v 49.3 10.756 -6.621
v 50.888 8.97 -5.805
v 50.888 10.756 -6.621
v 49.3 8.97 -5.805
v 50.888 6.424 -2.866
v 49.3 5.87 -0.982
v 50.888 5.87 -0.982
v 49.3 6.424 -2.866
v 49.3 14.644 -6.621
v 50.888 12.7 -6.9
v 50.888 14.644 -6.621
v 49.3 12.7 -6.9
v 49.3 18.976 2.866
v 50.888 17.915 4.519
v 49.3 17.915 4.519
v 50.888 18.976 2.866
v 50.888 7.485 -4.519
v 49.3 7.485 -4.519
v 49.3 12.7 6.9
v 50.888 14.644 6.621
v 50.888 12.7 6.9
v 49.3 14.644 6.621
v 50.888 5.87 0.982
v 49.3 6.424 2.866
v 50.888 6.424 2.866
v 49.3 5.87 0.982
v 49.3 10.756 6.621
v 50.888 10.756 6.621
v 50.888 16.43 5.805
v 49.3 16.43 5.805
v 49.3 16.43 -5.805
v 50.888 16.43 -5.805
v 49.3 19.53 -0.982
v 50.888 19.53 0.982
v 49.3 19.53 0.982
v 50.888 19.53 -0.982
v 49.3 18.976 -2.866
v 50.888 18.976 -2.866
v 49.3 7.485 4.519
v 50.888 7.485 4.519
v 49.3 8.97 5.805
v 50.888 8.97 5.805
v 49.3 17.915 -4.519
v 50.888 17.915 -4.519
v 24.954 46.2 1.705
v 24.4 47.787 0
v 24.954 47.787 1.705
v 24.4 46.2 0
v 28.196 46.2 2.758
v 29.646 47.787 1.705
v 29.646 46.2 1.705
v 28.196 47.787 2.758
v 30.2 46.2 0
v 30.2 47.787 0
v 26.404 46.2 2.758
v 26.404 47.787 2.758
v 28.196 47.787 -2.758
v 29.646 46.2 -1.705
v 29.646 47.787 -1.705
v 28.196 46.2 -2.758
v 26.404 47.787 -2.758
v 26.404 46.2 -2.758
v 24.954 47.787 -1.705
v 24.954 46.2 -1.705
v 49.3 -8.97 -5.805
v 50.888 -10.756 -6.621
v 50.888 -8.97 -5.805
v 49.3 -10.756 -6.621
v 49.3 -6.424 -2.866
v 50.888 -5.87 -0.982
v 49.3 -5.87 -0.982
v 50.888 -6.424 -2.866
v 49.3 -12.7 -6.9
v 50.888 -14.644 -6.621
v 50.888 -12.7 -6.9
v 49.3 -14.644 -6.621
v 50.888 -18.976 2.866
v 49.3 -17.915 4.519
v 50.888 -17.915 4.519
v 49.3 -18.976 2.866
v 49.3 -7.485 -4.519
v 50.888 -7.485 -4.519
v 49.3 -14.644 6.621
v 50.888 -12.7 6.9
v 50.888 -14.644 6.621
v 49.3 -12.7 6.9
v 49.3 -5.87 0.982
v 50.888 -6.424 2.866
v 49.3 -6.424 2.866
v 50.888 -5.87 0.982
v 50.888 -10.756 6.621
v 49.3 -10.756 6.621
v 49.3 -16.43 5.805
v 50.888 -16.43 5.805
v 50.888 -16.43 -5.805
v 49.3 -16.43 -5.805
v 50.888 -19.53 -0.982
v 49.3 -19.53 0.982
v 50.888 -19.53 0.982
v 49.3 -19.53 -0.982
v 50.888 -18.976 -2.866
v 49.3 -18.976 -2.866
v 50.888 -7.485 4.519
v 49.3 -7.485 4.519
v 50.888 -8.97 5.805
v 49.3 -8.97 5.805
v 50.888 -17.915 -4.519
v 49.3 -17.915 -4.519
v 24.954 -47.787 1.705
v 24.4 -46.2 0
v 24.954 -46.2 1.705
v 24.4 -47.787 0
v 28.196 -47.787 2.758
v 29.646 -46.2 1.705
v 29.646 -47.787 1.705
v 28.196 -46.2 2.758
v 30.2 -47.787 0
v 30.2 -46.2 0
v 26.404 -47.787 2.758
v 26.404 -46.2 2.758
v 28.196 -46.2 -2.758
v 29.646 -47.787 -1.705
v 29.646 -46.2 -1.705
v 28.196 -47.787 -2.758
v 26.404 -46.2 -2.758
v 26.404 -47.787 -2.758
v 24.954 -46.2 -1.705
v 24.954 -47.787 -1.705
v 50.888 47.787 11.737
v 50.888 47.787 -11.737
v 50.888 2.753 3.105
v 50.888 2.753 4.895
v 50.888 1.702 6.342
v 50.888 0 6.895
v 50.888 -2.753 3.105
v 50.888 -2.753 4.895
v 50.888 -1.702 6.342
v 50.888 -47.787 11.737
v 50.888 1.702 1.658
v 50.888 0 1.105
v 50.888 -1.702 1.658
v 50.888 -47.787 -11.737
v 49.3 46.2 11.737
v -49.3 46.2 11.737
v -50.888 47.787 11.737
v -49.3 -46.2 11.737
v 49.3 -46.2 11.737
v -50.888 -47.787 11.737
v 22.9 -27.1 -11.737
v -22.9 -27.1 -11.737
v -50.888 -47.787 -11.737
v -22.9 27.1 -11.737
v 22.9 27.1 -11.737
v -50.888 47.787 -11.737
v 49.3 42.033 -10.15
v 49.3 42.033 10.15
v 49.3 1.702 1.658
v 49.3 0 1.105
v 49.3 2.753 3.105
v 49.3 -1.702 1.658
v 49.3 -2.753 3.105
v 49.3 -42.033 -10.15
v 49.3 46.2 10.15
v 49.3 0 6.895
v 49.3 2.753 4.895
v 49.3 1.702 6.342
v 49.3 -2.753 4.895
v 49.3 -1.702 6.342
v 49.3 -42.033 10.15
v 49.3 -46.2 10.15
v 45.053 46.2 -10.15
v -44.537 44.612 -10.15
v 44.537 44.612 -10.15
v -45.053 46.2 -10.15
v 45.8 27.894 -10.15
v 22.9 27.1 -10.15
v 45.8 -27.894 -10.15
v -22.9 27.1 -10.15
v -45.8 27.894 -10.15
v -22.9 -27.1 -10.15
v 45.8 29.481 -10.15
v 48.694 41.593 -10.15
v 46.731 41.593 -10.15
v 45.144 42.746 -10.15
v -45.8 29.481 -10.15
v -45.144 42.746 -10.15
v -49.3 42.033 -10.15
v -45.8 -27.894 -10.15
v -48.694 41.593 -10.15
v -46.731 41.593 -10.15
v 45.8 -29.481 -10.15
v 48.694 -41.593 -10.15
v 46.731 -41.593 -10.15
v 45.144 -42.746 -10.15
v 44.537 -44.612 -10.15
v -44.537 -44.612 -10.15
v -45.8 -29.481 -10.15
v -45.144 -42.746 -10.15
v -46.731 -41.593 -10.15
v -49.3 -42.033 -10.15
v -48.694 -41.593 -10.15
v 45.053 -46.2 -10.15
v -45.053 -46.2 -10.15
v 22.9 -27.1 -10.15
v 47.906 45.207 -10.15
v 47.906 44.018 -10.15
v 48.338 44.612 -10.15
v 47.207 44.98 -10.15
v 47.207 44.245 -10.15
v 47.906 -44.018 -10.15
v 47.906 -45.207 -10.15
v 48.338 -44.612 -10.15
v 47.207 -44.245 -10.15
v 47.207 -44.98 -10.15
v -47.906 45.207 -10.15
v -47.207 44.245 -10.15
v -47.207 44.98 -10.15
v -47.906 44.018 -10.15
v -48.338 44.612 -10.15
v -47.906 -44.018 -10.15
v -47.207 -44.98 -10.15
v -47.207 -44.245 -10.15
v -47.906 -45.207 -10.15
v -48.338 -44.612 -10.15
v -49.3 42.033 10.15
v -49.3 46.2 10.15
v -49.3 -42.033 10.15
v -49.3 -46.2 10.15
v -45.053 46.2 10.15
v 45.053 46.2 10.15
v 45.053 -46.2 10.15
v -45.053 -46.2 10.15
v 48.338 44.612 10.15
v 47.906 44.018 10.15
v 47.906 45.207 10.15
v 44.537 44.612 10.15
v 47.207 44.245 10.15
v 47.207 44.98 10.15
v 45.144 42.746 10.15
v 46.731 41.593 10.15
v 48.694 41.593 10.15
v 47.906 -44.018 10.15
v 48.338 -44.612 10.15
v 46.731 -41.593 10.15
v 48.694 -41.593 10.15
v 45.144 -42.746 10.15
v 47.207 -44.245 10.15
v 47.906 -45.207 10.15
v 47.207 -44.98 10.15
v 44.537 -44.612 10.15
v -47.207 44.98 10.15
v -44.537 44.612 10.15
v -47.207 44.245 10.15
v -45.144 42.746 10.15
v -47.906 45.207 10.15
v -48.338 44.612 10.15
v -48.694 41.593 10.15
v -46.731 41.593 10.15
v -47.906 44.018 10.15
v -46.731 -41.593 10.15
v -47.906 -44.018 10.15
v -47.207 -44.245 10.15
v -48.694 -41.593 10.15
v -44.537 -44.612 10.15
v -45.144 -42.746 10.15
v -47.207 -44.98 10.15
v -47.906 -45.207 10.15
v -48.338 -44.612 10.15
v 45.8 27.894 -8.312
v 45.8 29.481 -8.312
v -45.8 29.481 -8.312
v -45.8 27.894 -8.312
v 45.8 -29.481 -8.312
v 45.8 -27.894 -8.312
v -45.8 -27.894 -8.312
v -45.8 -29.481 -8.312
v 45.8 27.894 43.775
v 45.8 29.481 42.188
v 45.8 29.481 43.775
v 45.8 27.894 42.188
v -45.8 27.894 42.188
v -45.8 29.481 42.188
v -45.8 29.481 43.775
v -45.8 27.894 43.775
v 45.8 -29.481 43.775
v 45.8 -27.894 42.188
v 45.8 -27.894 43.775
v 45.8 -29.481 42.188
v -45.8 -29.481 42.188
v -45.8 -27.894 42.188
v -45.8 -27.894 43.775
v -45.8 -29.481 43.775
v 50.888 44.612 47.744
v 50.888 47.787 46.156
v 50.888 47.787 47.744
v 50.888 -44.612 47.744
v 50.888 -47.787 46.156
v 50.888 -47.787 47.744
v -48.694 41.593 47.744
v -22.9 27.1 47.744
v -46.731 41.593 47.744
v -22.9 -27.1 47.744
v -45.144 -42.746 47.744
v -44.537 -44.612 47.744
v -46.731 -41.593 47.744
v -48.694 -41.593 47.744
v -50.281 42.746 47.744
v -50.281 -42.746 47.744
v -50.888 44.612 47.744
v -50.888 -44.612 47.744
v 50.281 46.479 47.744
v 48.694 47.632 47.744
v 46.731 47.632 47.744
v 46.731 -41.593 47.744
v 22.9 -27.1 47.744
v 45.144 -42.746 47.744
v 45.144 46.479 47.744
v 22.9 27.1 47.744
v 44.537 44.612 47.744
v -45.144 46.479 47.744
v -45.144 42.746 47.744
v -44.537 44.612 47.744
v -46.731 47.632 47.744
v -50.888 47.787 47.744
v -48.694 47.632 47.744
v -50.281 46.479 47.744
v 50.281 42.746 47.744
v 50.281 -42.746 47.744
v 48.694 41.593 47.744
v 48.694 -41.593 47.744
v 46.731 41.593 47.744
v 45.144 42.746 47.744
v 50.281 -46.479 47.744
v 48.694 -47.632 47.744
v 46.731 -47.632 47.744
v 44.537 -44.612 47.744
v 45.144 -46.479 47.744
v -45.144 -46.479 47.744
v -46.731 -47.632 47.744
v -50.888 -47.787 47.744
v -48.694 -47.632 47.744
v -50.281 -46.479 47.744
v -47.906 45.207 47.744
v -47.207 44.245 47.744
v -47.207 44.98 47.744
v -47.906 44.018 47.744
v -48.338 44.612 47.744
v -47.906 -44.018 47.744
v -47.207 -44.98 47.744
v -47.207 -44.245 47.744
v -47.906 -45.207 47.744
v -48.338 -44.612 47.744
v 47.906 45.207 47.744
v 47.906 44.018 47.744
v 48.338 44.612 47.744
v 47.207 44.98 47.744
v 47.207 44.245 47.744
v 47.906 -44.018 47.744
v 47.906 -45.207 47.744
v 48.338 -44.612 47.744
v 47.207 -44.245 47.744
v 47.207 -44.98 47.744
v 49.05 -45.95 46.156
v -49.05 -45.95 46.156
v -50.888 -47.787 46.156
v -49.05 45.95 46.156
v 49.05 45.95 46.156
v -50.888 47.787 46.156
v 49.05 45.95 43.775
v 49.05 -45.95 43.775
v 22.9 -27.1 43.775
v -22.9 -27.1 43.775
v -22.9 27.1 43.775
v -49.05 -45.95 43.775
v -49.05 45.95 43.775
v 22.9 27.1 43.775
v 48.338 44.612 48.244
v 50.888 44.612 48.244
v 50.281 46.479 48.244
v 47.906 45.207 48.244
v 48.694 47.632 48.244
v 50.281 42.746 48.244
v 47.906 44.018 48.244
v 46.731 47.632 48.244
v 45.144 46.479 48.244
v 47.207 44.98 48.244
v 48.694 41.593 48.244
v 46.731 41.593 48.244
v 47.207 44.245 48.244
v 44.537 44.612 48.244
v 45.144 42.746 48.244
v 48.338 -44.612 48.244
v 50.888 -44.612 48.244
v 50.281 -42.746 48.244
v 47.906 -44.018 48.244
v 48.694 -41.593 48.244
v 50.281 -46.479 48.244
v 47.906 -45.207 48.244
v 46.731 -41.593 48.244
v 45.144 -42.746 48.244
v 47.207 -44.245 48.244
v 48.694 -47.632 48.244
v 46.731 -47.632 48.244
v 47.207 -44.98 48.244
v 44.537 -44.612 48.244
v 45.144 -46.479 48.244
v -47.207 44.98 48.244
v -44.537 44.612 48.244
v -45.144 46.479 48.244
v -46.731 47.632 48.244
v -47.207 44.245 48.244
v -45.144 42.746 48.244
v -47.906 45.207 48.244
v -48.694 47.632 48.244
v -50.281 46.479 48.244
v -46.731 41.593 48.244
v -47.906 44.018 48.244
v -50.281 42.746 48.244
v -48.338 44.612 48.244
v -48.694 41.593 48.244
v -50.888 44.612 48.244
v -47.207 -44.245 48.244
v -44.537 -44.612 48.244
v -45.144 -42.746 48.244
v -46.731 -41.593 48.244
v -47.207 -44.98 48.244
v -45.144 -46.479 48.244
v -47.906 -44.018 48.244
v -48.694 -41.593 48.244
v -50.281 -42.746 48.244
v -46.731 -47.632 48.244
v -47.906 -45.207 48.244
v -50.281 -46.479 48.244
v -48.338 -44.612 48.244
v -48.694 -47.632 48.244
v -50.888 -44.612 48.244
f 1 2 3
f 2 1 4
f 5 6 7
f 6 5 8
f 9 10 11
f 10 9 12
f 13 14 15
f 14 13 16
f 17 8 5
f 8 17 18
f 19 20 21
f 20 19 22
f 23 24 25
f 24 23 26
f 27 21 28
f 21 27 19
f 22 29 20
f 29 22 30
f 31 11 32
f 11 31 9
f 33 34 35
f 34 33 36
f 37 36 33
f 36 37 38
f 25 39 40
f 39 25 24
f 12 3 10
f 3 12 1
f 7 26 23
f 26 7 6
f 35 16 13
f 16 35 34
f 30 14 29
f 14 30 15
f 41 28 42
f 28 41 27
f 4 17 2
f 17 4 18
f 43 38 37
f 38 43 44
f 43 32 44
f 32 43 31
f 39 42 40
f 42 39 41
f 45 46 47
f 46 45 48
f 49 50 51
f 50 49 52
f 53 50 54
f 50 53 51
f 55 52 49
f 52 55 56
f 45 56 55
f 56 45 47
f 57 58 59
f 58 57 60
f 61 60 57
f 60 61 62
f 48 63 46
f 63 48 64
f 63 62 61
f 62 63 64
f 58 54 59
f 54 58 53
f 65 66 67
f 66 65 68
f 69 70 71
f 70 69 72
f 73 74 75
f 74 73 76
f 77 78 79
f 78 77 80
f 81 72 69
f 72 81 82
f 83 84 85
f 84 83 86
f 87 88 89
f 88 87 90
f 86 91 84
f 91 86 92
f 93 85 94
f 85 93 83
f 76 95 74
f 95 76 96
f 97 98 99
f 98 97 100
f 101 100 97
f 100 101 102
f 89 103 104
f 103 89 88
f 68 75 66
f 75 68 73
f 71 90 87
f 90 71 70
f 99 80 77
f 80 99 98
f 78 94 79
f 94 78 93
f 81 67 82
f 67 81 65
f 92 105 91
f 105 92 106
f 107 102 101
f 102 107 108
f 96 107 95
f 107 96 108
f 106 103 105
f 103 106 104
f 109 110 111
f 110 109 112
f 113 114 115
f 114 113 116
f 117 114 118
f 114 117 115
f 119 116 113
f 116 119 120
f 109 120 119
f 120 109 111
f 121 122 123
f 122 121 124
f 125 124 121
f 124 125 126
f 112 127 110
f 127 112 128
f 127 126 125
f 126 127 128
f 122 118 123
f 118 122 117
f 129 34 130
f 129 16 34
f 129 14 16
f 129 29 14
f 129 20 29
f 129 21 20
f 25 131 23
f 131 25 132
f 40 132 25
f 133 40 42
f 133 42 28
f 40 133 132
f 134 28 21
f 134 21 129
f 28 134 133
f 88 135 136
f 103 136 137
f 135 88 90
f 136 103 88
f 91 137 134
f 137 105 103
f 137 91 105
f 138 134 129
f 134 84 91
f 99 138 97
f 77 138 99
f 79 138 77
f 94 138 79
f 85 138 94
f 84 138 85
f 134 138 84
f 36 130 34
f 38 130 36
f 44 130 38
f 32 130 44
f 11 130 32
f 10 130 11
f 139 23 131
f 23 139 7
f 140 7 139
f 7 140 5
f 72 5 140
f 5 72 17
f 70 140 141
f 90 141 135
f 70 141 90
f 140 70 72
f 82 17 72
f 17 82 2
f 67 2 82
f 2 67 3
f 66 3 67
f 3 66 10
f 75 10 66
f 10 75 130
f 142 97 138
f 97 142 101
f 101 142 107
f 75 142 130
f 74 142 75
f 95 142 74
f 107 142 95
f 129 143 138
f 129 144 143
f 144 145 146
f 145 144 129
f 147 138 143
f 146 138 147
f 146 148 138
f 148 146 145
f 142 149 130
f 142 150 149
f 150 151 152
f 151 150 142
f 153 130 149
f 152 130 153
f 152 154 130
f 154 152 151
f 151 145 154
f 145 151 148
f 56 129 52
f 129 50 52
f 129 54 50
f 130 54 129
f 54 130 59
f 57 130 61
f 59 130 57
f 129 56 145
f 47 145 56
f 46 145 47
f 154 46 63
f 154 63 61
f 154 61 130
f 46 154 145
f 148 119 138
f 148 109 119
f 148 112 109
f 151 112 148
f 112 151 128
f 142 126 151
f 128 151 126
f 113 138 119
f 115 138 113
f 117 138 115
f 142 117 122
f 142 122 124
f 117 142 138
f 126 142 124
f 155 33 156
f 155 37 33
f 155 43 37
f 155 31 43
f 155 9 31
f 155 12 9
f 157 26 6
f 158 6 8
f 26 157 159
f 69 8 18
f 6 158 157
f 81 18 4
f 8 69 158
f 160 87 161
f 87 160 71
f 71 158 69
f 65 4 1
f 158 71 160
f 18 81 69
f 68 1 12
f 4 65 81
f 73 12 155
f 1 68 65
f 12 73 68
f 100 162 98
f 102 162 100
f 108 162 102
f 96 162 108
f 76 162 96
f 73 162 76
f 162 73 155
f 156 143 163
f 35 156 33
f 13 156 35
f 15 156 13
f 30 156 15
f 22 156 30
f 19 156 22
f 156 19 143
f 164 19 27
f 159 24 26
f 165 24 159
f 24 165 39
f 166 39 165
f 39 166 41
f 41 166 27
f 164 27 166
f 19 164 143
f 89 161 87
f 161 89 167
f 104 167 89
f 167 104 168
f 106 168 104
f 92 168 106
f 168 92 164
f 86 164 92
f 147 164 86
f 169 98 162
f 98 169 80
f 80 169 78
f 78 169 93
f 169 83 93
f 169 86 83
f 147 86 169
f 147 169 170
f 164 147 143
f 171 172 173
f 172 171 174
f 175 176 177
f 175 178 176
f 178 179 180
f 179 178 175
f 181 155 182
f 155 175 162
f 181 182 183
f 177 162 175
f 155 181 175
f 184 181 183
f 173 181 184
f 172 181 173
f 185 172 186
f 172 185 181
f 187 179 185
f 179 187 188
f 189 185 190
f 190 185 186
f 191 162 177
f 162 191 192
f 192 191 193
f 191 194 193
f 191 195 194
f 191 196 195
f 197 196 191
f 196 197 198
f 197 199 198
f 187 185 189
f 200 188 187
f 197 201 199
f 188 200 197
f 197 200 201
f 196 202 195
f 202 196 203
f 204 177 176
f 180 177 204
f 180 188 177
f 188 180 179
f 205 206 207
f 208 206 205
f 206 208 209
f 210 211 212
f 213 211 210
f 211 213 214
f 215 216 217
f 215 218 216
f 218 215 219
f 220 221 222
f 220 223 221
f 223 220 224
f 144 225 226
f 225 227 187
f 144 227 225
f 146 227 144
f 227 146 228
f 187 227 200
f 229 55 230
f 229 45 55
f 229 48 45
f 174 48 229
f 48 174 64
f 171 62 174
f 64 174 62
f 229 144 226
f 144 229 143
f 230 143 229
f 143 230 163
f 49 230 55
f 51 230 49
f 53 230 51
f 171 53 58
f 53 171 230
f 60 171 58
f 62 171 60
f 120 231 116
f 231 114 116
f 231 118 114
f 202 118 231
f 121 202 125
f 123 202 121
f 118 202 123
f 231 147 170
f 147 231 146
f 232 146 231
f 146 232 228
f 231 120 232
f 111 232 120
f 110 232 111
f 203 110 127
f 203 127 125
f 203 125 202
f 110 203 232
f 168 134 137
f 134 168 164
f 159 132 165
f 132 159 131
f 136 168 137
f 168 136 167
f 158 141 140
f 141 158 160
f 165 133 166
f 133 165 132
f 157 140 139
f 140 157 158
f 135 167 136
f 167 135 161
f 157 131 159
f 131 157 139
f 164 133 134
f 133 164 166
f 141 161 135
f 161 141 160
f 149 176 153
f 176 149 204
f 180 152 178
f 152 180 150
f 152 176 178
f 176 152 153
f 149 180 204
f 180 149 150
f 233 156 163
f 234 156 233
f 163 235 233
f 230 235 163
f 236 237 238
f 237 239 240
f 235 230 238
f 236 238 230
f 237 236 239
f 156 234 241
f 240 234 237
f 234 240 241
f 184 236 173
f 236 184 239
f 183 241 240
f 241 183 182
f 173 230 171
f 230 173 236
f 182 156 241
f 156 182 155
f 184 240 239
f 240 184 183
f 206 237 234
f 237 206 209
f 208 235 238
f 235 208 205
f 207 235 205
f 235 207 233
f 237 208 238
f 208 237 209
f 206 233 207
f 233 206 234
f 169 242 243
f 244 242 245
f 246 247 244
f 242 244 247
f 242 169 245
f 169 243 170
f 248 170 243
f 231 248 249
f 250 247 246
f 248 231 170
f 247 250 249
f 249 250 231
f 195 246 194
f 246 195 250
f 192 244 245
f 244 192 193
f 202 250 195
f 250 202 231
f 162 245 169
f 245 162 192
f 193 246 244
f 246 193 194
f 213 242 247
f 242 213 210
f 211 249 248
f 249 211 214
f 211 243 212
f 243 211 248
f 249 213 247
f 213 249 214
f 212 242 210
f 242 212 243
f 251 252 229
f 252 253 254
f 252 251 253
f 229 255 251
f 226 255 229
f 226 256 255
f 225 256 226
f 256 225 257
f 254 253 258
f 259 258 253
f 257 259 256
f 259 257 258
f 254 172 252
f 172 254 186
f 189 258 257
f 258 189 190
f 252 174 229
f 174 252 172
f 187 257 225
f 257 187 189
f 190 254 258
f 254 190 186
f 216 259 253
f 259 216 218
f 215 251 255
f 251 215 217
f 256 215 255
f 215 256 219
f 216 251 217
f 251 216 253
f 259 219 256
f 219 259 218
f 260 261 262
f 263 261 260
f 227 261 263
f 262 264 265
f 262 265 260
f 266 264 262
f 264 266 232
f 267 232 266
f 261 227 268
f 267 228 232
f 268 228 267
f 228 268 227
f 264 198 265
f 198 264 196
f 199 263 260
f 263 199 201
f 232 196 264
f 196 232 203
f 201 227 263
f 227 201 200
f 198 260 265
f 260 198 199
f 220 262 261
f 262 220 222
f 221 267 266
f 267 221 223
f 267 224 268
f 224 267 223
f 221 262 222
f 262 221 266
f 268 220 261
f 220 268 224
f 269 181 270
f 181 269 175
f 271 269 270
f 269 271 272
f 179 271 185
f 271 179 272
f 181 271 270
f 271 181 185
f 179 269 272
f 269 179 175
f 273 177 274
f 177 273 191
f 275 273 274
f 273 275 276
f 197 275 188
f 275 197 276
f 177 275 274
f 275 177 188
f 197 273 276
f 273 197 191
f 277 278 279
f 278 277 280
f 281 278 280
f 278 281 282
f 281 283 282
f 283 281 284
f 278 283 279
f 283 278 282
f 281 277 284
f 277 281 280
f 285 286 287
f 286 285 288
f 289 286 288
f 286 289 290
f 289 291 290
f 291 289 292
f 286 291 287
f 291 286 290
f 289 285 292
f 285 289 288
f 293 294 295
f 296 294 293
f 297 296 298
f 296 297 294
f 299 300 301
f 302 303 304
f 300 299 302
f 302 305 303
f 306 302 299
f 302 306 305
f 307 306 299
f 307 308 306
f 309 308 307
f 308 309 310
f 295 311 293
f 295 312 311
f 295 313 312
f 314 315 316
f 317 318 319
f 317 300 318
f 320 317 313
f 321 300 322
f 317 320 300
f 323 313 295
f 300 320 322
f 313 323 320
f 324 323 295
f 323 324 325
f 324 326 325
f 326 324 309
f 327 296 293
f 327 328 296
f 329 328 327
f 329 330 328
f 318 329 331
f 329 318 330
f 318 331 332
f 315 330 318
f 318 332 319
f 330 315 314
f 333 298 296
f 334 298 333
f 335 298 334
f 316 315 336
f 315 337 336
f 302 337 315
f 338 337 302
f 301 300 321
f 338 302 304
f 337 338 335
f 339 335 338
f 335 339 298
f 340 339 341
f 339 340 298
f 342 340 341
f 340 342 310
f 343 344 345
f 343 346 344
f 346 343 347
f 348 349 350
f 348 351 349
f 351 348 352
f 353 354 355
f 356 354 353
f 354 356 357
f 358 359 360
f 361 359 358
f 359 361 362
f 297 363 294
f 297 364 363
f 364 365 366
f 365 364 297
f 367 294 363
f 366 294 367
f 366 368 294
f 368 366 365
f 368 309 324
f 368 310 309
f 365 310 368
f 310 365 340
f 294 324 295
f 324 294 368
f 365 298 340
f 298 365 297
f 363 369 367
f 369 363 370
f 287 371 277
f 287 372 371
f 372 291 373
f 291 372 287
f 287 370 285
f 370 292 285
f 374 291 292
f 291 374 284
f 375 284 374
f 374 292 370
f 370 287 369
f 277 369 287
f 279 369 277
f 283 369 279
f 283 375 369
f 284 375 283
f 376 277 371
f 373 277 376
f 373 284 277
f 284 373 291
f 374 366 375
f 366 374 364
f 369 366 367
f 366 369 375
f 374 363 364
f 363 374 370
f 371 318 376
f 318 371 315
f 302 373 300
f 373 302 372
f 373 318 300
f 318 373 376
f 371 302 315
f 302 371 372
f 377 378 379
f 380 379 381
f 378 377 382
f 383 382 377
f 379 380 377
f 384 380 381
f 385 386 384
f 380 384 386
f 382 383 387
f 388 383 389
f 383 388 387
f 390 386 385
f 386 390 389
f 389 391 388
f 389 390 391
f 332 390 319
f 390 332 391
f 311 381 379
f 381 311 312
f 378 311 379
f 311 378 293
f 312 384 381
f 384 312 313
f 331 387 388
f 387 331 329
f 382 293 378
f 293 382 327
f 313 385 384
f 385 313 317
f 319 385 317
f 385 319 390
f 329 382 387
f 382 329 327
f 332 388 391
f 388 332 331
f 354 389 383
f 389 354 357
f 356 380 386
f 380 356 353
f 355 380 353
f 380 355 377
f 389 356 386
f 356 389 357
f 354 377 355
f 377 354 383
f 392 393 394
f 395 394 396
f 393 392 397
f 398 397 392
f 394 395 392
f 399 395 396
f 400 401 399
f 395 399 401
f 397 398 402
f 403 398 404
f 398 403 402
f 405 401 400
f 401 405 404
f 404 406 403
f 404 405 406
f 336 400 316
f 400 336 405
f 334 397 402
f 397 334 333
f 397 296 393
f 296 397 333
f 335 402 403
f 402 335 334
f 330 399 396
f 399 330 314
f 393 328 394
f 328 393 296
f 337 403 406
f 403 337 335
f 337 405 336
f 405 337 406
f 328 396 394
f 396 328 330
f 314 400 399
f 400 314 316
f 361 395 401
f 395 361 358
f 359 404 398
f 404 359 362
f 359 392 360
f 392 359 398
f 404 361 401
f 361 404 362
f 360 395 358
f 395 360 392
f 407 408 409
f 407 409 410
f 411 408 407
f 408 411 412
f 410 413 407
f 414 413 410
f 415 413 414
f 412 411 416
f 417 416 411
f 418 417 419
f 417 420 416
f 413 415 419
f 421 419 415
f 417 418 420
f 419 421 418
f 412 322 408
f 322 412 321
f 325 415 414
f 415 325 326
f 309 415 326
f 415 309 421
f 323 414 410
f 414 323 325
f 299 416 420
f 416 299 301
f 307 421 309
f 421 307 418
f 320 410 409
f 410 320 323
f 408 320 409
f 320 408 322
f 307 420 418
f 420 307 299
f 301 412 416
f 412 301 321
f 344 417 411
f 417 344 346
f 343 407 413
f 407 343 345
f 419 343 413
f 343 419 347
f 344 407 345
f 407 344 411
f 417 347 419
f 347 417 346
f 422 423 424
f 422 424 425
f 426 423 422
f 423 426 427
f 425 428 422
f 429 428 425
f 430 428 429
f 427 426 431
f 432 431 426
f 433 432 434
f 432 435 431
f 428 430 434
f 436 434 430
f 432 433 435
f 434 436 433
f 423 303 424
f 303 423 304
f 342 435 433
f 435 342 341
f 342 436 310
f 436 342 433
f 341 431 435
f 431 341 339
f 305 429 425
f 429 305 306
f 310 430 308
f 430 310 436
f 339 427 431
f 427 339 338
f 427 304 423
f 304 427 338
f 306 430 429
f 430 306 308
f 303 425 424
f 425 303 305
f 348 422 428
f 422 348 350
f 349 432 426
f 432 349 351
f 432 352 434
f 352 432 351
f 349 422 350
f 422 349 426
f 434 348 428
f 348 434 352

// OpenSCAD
matrice_x = 98.1;
matrice_y = 100.1;
matrice_z = 26.4;
wall_thickness = 3.175/2;
tolerance = 0.5;
board_x = 91.6;
board_y = 54.2;
board_z = 19.8;
pow_data_port_diameter = 13.8;
pow_data_port_x = 6.5;
pow_data_port_flange_diameter = 17.0;
pow_data_port_separation = 25.4;
led_diameter = 5.79;
led_flange_diamter = 7.8;
antenna_port_diameter = 5.8;
antenna_flange_diameter = 8.0;
antenna_port_offset = board_x - 37.0; //flexible
antenna_separation = 92.9;
screw_diameter = 1.25;  //tbd but 1.25 looks reasonable 
screw_head_diameter = 2.5; //tbd
screw_length = 12.5; //tbd but 12.5 looks reasonable
ziptie_width = 4.0; //tbd but 4 looks reasonable


cavity_x = board_x + pow_data_port_x + tolerance;
cavity_y = antenna_separation - tolerance;
cavity_z = board_z + tolerance;
box_x = cavity_x + 2* wall_thickness;
box_y = cavity_y + 2* wall_thickness;
box_z = cavity_z + 2* wall_thickness;
heat_sink_x = board_x /2;
heat_sink_y = board_y;
heat_sink_z = (matrice_z - box_z) / 2; 
screw_head_diameter = screw_diameter + wall_thickness/2;
///*
//box without lid
union()
{
    //basic box shape and openings
    difference()
    {
        cube([box_x, box_y, box_z], center = true);
        //hollow out box
        cube([cavity_x,cavity_y,cavity_z], center = true);
        //remove top
        translate([0,0,box_z/2]) cube([cavity_x, cavity_y, wall_thickness*3], center = true);
        //mirroring for y symmetrical ports
        for (y_offset = [0:1])
        {
            mirror([0,y_offset,0])
            {
                //power/data port openings
                translate([box_x/2,pow_data_port_separation/2,0]) rotate([0,90,0]) cylinder(h=wall_thickness*3,r= pow_data_port_diameter/2, center = true);
                //antenna port openings
                translate([antenna_port_offset/2,box_y/2,0]) rotate([90,0,0]) cylinder(h=wall_thickness*3, r= antenna_port_diameter/2, center = true);
            }
        }
        // led opening
        // vertical offset is arbitrary but it has to be higher than the power/data ports but near them
        translate([box_x/2,0,4]) rotate([0,90,0]) cylinder(h=wall_thickness*3,r= led_diameter/2, center = true);
        // heat sink opening
        translate([0,0,-box_z/2]) cube([heat_sink_x, heat_sink_y, 10], center = true);
    }
    //screw posts
    //mirroring to put one in each corner
    for (x_offset = [0:1])
    {
        mirror([x_offset,0,0])
        {    
            for (y_offset = [0:1])
            {
                mirror([0,y_offset,0])
                {  
                    difference()
                    {
                        translate([cavity_x/2-wall_thickness,cavity_y/2-wall_thickness,0]) cylinder(h=cavity_z, r=wall_thickness*2, center = true);
                        translate([cavity_x/2-wall_thickness,cavity_y/2-wall_thickness,0]) cylinder(h=cavity_z, r=screw_diameter/2, center = true);
                    }
                }
            }
        }
    }
    //guide rails for radio
    for (y_offset = [0:1])
    {
    mirror([0,y_offset,0]) translate([0,board_y/2 + wall_thickness,-board_z/2]) cube([board_x,wall_thickness,wall_thickness*2], center = true);
    }
}
//*/
///*
//lid
translate([0,0,2*box_z])
{
    difference()
    {
        union()
        {
            cube([box_x, box_y, wall_thickness], center = true);
            translate([0,0,-wall_thickness]) cube([cavity_x-tolerance,cavity_y-tolerance,2*wall_thickness], center = true);
            //guide rails for radio
            for (y_offset = [0:1])
            {
            mirror([0,y_offset,0]) translate([0,board_y/2 + wall_thickness,-wall_thickness*2]) cube([board_x,wall_thickness,wall_thickness*2], center = true);
            }
            
        }
        // heat sink opening
        translate([0,0,0]) cube([heat_sink_x, heat_sink_y, 10], center = true);
    }
    //screw posts
    //mirroring to put one in each corner
    for (x_offset = [0:1])
    {
        mirror([x_offset,0,0])
        {    
            for (y_offset = [0:1])
            {
                mirror([0,y_offset,0])
                {  
                    difference()
                    {
                        translate([cavity_x/2-wall_thickness,cavity_y/2-wall_thickness,tolerance]) cylinder(h=wall_thickness, r=wall_thickness*2, center = true);
                        translate([cavity_x/2-wall_thickness,cavity_y/2-wall_thickness,tolerance]) cylinder(h=wall_thickness, r=screw_diameter/2, center = true);
                    }
                }
            }
        }
    }
}
//*/
